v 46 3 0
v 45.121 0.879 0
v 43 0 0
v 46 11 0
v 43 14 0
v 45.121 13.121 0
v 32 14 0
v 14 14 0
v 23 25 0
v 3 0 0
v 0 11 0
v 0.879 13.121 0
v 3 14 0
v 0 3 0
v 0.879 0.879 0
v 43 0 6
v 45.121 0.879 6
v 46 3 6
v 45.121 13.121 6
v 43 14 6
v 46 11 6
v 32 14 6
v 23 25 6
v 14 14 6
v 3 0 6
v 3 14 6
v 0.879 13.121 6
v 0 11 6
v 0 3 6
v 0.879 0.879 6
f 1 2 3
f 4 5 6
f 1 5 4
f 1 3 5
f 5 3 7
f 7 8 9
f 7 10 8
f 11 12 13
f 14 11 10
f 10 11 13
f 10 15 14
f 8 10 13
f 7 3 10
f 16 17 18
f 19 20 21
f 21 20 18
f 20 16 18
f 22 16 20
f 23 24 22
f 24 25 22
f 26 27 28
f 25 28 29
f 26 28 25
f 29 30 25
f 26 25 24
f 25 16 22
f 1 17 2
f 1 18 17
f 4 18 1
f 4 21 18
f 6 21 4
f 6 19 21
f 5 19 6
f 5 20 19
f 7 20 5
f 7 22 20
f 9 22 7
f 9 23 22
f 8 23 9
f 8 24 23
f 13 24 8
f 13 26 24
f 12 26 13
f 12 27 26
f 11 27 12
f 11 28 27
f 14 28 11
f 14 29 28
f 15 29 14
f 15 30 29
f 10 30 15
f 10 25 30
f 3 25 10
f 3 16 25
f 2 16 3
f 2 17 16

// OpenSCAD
$fn = 32;

// ----------------------------------------------------------------------
// Ratchet pawl: 46 x 14 mm body, beak 11 mm сверху
// ----------------------------------------------------------------------

// --- parameters (mm) ---
profile_height = 6;       // extrusion height
profile_points = 15;      // points of the closed outline

profile = [[0, 3], [0.879, 0.879], [3, 0], [43, 0], [45.121, 0.879], [46, 3], [46, 11], [45.121, 13.121], [43, 14], [32, 14], [23, 25], [14, 14], [3, 14], [0.879, 13.121], [0, 11]];  // single closed polygon, 15 points, counter clockwise

// --- the one profile operation ---
linear_extrude(height = profile_height) polygon(points = profile);
